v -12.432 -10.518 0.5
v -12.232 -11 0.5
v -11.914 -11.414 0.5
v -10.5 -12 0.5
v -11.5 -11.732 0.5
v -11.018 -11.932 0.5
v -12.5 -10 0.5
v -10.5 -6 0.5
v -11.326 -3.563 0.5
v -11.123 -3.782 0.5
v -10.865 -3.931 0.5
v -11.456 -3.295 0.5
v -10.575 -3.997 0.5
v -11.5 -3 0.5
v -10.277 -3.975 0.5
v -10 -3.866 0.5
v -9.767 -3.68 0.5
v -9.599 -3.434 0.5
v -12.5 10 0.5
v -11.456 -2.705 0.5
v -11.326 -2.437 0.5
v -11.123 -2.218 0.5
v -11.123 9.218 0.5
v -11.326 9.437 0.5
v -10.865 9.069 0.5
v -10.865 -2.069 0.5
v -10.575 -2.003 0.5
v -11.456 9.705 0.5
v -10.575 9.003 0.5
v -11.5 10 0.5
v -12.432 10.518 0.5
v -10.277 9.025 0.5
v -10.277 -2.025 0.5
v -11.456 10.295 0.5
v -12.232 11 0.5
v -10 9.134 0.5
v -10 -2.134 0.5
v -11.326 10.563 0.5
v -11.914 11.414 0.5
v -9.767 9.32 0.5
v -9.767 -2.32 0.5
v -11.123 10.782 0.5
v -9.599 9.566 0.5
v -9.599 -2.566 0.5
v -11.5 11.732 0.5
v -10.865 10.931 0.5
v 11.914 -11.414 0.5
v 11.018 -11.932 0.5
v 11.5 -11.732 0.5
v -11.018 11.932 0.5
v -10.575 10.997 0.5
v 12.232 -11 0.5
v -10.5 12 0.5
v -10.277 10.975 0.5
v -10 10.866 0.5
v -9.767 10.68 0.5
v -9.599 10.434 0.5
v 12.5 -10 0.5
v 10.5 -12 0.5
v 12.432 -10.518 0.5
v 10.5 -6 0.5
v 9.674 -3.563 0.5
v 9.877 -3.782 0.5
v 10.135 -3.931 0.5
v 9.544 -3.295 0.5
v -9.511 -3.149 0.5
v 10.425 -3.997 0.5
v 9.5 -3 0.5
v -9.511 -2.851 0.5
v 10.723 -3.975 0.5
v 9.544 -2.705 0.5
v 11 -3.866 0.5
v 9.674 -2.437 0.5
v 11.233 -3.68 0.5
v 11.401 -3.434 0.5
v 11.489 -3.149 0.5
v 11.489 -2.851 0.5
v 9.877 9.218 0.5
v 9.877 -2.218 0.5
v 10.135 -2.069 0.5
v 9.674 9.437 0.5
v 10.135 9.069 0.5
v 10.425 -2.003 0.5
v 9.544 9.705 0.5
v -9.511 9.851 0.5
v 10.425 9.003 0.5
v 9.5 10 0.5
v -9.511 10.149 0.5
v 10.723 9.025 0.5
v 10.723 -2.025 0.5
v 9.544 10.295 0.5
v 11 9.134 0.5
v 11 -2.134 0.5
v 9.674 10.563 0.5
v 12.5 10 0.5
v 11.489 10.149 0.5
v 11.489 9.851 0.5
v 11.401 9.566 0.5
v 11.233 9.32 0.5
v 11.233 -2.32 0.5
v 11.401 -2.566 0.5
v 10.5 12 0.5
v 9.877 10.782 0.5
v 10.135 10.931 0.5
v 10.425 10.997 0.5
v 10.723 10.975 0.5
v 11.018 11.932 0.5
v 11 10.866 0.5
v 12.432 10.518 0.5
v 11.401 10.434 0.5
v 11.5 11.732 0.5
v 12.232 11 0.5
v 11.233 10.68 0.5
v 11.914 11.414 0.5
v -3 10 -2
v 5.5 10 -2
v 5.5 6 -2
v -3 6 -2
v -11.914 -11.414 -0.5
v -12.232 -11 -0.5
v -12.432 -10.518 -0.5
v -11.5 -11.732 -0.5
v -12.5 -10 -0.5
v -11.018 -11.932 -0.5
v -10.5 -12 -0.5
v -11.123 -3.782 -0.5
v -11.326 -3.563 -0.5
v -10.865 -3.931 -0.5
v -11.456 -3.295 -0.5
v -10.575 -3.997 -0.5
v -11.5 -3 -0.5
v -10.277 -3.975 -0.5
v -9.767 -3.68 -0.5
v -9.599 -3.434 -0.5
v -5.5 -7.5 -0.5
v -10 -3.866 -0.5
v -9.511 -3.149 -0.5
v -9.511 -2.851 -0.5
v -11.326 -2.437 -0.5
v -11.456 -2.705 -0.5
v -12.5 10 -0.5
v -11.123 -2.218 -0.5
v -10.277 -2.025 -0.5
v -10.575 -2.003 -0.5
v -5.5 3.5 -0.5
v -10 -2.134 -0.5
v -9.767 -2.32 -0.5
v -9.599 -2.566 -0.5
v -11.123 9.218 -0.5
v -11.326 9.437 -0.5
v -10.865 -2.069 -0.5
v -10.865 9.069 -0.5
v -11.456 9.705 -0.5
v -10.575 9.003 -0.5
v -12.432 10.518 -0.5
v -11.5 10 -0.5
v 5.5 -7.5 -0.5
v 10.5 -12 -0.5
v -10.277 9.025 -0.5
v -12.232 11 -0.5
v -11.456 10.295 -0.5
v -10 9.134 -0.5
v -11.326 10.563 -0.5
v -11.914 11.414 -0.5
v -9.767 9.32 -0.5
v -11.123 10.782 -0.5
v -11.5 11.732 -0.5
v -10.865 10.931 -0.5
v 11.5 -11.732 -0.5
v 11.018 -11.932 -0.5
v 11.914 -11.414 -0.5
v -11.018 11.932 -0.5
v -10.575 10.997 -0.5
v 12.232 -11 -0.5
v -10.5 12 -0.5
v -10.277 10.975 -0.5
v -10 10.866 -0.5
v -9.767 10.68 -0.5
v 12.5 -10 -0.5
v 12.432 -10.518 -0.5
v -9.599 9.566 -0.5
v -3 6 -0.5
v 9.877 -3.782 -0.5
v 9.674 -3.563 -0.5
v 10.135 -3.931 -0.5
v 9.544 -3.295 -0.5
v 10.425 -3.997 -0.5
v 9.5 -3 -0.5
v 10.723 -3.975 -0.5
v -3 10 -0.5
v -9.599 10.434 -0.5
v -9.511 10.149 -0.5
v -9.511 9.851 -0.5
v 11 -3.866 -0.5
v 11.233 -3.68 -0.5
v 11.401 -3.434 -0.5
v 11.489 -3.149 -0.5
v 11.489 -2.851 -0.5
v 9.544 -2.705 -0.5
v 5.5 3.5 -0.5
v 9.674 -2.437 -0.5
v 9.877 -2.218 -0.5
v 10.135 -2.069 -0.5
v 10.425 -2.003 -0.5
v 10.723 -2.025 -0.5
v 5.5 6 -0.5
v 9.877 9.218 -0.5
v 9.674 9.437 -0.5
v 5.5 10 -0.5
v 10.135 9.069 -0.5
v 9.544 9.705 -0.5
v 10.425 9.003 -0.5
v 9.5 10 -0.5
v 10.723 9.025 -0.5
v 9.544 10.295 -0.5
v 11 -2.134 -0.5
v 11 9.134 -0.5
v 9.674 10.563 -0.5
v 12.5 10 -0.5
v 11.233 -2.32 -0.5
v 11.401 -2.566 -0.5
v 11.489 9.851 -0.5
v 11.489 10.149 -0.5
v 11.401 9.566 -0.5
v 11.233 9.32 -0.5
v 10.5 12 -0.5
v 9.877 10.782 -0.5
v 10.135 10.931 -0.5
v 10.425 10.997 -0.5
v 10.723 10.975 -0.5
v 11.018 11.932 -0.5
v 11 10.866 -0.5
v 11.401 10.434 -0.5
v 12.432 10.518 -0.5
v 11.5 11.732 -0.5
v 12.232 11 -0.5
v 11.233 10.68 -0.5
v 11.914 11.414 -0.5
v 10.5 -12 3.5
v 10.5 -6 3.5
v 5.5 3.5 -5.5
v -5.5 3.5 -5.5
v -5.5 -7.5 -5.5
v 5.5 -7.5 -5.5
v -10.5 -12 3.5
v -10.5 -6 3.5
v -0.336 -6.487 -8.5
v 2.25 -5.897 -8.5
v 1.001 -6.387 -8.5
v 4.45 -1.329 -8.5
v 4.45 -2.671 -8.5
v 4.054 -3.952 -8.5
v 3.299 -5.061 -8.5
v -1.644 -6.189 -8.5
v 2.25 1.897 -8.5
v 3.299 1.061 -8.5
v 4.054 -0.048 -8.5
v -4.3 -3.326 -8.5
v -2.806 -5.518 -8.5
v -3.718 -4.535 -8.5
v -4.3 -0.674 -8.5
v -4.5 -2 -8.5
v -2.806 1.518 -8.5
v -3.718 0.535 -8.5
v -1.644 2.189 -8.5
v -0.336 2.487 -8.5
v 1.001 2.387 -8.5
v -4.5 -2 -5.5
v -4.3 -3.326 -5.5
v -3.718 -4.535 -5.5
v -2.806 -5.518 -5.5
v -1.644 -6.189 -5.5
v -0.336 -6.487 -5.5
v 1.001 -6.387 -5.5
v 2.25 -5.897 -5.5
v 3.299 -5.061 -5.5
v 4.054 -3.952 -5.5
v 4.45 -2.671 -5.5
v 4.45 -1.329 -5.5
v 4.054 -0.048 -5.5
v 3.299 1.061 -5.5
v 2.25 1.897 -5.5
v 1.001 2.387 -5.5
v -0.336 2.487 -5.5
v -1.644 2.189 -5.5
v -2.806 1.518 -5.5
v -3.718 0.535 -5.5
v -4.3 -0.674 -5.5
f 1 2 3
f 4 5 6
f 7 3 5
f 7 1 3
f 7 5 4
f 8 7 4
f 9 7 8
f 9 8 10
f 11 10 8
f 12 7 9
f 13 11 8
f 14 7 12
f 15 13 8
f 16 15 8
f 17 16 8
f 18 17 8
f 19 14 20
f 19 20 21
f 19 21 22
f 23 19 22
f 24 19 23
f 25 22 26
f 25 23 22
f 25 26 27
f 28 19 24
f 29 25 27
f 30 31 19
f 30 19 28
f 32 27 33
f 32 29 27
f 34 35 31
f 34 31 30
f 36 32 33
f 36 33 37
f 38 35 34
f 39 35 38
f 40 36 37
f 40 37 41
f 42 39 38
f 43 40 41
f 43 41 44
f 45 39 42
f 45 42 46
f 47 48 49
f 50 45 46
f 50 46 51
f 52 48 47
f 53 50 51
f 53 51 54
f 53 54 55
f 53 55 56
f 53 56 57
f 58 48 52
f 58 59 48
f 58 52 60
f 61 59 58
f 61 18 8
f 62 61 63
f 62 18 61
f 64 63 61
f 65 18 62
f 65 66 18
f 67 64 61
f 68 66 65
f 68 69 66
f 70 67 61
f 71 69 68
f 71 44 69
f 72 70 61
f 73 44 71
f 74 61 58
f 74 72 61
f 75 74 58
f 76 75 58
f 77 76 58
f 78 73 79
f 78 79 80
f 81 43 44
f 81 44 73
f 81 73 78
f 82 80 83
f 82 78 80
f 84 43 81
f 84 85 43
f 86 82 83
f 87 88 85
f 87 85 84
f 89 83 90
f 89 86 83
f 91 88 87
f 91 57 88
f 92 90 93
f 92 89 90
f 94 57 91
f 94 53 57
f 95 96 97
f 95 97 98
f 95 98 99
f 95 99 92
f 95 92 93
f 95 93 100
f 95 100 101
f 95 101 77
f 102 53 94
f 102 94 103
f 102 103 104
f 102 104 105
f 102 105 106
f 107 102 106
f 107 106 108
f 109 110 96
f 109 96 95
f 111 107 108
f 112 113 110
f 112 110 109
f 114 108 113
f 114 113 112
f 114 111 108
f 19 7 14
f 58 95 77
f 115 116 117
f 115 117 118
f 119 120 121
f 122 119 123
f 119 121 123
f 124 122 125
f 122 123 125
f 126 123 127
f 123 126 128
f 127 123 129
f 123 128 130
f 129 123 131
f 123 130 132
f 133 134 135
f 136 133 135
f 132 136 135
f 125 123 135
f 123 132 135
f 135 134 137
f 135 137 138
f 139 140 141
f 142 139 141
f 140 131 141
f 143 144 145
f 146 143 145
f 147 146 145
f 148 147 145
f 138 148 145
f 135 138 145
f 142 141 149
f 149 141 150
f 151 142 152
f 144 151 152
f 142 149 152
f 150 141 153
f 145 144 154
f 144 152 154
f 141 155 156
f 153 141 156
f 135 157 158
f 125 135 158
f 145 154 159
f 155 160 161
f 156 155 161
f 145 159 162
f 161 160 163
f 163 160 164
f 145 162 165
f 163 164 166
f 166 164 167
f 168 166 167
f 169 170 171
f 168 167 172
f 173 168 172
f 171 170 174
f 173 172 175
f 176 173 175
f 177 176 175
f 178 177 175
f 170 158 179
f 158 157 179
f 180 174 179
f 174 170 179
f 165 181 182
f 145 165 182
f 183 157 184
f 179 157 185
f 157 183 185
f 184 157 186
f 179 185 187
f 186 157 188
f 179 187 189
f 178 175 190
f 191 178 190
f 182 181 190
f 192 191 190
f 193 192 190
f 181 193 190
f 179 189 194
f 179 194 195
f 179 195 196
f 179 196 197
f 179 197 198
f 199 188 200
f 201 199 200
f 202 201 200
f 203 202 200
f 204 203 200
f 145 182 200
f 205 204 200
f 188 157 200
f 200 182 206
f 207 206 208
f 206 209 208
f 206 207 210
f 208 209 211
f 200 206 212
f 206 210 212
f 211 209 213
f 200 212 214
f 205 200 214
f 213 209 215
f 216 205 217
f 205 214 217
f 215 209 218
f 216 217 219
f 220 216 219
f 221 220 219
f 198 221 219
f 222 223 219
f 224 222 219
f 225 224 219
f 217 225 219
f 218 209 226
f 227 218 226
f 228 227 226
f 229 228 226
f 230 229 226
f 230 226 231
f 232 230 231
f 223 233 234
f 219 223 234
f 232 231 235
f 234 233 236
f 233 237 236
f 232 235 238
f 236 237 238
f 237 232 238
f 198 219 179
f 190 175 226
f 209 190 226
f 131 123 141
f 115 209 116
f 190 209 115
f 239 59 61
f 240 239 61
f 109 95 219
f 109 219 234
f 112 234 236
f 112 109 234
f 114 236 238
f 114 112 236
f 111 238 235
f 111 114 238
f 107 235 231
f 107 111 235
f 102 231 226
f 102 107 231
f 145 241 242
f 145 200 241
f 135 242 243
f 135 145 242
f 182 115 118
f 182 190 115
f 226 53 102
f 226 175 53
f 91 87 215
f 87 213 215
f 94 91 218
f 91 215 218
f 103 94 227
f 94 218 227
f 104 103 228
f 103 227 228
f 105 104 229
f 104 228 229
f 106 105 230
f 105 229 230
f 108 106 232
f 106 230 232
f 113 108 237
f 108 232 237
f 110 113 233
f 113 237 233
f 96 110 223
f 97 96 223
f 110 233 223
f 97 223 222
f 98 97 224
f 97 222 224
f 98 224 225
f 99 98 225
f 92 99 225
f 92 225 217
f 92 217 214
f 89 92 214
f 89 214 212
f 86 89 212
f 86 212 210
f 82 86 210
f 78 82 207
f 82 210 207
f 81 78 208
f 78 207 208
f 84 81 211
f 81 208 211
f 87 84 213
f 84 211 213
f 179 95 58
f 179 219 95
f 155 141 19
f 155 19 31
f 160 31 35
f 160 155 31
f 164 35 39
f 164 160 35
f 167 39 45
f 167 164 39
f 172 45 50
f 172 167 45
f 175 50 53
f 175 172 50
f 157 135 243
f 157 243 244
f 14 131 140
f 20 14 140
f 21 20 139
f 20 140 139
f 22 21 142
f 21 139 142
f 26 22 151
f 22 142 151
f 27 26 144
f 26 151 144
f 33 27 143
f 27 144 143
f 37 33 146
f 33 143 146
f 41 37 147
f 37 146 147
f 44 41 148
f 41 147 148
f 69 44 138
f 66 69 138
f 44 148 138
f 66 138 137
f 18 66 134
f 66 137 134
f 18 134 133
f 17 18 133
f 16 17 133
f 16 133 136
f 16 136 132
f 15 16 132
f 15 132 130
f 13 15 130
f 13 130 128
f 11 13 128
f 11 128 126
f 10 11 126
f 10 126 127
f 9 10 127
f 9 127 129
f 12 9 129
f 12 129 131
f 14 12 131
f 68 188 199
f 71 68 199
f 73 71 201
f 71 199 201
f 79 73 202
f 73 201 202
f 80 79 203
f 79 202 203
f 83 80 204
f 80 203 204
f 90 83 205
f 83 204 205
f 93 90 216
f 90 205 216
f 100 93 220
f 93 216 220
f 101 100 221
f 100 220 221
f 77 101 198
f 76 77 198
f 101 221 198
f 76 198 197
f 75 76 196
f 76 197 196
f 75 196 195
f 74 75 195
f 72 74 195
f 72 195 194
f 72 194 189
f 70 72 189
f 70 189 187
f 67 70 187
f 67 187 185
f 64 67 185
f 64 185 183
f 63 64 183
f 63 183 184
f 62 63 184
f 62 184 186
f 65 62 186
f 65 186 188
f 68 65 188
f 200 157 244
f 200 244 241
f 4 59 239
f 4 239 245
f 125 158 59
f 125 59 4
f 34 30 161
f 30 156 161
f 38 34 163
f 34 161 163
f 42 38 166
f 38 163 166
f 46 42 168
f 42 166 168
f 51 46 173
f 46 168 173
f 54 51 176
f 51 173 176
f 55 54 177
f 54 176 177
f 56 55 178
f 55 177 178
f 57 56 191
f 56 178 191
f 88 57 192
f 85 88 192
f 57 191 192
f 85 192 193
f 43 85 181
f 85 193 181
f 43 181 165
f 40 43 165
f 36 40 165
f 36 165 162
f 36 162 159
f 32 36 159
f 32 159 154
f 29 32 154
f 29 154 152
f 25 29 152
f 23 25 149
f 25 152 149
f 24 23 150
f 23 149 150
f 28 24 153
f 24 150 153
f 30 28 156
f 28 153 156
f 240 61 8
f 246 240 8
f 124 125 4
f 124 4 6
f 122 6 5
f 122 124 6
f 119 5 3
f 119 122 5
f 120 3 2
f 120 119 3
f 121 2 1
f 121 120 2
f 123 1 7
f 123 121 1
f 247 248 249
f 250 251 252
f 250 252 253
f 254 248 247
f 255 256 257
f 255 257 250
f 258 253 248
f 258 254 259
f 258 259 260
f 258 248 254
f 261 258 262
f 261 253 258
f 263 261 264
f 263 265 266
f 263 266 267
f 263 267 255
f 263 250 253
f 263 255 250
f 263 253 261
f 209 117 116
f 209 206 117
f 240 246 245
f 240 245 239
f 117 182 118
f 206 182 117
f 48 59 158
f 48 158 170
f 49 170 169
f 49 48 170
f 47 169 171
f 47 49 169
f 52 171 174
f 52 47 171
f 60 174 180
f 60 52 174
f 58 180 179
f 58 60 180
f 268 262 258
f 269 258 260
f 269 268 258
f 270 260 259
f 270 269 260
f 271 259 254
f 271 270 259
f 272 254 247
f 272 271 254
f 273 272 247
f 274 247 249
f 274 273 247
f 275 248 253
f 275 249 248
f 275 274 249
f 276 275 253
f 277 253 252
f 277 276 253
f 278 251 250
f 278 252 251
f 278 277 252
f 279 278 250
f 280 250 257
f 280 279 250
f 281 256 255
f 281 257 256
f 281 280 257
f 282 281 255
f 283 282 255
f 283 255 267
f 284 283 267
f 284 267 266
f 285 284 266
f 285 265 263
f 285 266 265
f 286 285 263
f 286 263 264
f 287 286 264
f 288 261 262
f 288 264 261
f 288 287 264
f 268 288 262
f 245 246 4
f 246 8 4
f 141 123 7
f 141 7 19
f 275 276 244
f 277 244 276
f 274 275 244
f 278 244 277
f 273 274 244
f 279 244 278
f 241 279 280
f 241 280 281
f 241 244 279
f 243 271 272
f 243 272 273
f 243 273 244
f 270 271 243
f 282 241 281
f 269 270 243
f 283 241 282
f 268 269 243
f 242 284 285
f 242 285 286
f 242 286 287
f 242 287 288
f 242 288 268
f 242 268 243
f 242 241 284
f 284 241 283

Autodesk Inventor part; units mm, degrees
ref_plane "YZ Plane" through (0, 0, 0) normal (1, 0, 0) x (0, 1, 0)
ref_plane "XZ Plane" through (0, 0, 0) normal (0, 1, 0) x (-1, 0, 0)
ref_plane "XY Plane" through (0, 0, 0) normal (0, 0, 1) x (1, 0, 0)
sketch "Sketch1" plane through (0, 0, 0) normal (0, 0, 1) x (1, 0, 0)
  line L0 (12.5, -12) -> (-12.5, -12)
  line L1 (-12.5, -12) -> (-12.5, 12)
  line L2 (-12.5, 12) -> (12.5, 12)
  line L3 (12.5, 12) -> (12.5, -12)
  line L4 (12.5, -12) -> (-12.5, 12) construction
  line L5 (-12.5, -12) -> (12.5, 12) construction
  point P0 (0, 0)
  dimension "d0" = 24
  dimension "d1" = 25
extrude "Extrusion1" add sketch "Sketch1" along normal mid plane 1
sketch "Sketch2" plane through (0, 0, -0.5) normal (0, 0, -1) x (-1, 0, 0)
  line L0 (-5.5, 3.5) -> (5.5, 3.5)
  line L1 (5.5, 3.5) -> (5.5, -7.5)
  line L2 (5.5, -7.5) -> (-5.5, -7.5)
  line L3 (-5.5, -7.5) -> (-5.5, 3.5)
  line L4 (-5.5, 3.5) -> (5.5, -7.5) construction
  line L5 (5.5, 3.5) -> (-5.5, -7.5) construction
  line L6 (-12.5, -12) -> (12.5, -12) projected
  point P0 (0, 0)
  point P1 (0, -2)
  point P2 (0, -2)
  dimension "d4" = 11
  dimension "d5" = 11
  dimension "d6" = 4.5
extrude "Extrusion2" add sketch "Sketch2" along normal blind 5
sketch "Sketch3" plane through (0, 0, -0.5) normal (0, 0, -1) x (-1, 0, 0)
  circle A0 centre (0, -2) radius 4.5
  line L0 (5.5, 3.5) -> (-5.5, 3.5) projected
  line L1 (5.5, -7.5) -> (5.5, 3.5) projected
  point P0 (0, 0)
  point P1 (0, 3.5)
  point P2 (5.5, -2)
  dimension "d9" = 9
extrude "Extrusion3" add sketch "Sketch3" along normal blind 8
sketch "Sketch4" plane through (0, 0, -0.5) normal (0, 0, -1) x (-1, 0, 0)
  line L0 (3, 6) -> (-5.5, 6)
  line L1 (-5.5, 6) -> (-5.5, 10)
  line L2 (-5.5, 10) -> (3, 10)
  line L3 (3, 10) -> (3, 6)
  line L4 (3, 6) -> (-5.5, 10) construction
  line L5 (-5.5, 6) -> (3, 10) construction
  line L6 (12.5, 12) -> (-12.5, 12) projected
  line L7 (-12.5, 12) -> (-12.5, -12) projected
  point P0 (0, 0)
  point P1 (-1.25, 8)
  dimension "d12" = 8.5
  dimension "d13" = 4
  dimension "d14" = 2
  dimension "d15" = 7
extrude "Extrusion4" add sketch "Sketch4" along normal blind 1.5
sketch "Sketch5" plane through (0, 0, -0.5) normal (0, 0, -1) x (-1, 0, 0)
  line L0 (11.5, -4) -> (-11.5, -4) construction
  line L1 (-11.5, -4) -> (-11.5, 11) construction
  line L2 (-11.5, 11) -> (11.5, 11) construction
  line L3 (11.5, 11) -> (11.5, -4) construction
  line L4 (11.5, -4) -> (-11.5, 11) construction
  line L5 (-11.5, -4) -> (11.5, 11) construction
  line L6 (12.5, 12) -> (-12.5, 12) projected
  line L7 (12.5, -12) -> (12.5, 12) projected
  circle A0 centre (-10.5, 10) radius 1
  circle A1 centre (10.5, 10) radius 1
  circle A2 centre (-10.5, -3) radius 1
  circle A3 centre (10.5, -3) radius 1
  point P0 (0, 0)
  point P1 (0, 3.5)
  point P2 (0, 11)
  point P3 (0, 12)
  dimension "d19" = 15
  dimension "d20" = 1
  dimension "d21" = 1
  dimension "d22" = 2
  dimension "d23" = 2
  dimension "d24" = 2
  dimension "d25" = 2
extrude "Extrusion5" cut sketch "Sketch5" against normal through all
sketch "Sketch6" plane through (0, 0, -0.5) normal (0, 0, 1) x (1, 0, 0)
  line L0 (-10.5, -12) -> (10.5, -12)
  line L1 (10.5, -12) -> (10.5, -6)
  line L2 (10.5, -6) -> (-10.5, -6)
  line L3 (-10.5, -6) -> (-10.5, -12)
  line L4 (-10.5, -12) -> (10.5, -6) construction
  line L5 (10.5, -12) -> (-10.5, -6) construction
  line L6 (-12.5, -12) -> (12.5, -12) projected
  point P0 (0, 0)
  point P1 (0, -9)
  point P2 (0, -9)
  dimension "d28" = 21
  dimension "d29" = 6
extrude "Extrusion6" add sketch "Sketch6" along normal blind 4
fillet "Fillet1" radius 2 4 edges at (12.5, 12, 0) (12.5, -12, 0) (-12.5, 12, 0) (-12.5, -12, 0)
equation "\"d5\" = d4"
equation "\"d23\" = d22"
equation "\"d24\" = d22"
equation "\"d25\" = d24"
properties part number "raspberry pi camera v2"
